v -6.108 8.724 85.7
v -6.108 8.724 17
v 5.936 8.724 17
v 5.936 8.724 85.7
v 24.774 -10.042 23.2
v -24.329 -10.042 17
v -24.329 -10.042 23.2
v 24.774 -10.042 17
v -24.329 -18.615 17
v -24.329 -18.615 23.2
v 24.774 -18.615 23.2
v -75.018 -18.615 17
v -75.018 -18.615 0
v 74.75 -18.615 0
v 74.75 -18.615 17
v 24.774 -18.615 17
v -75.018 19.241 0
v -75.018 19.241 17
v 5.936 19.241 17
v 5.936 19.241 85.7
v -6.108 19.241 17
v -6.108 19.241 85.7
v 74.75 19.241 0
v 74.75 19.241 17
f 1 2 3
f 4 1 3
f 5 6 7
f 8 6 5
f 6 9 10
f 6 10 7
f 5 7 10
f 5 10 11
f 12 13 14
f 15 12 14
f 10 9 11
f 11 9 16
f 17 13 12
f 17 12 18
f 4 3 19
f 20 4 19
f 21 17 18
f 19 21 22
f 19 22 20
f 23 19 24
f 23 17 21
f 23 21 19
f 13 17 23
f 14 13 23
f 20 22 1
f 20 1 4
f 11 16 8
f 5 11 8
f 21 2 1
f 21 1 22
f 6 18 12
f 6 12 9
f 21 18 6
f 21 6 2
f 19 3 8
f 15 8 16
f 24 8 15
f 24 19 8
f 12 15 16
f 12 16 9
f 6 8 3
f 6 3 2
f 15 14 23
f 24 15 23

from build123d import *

# Parameters (mm, degrees)
F0_W     = 149.768152
F0_H     = 37.856524
F1_DEPTH = 17
F2_W     = 12.044117
F2_H     = 10.517036
F3_DEPTH = 68.7
F2_W_2   = 49.102947
F2_H_2   = 8.573649
F4_DEPTH = 6.2


with BuildPart() as f1:
    # F0 (on Top) → F1 (new body)
    with BuildSketch(Plane.XY):
        with Locations((-0.134293, 0.313039)):
            Rectangle(F0_W, F0_H)
    extrude(amount=F1_DEPTH)

    # F2 (on face) → F3 (join)
    with BuildSketch(Plane.XY.offset(17)):
        with Locations((-0.08639, 13.982783)):
            Rectangle(F2_W, F2_H)
    extrude(amount=F3_DEPTH)

    # F2 (on face) → F4 (join)
    with BuildSketch(Plane.XY.offset(17)):
        with Locations((0.222437, -14.328398)):
            Rectangle(F2_W_2, F2_H_2)
    extrude(amount=F4_DEPTH)


solid = f1.part
